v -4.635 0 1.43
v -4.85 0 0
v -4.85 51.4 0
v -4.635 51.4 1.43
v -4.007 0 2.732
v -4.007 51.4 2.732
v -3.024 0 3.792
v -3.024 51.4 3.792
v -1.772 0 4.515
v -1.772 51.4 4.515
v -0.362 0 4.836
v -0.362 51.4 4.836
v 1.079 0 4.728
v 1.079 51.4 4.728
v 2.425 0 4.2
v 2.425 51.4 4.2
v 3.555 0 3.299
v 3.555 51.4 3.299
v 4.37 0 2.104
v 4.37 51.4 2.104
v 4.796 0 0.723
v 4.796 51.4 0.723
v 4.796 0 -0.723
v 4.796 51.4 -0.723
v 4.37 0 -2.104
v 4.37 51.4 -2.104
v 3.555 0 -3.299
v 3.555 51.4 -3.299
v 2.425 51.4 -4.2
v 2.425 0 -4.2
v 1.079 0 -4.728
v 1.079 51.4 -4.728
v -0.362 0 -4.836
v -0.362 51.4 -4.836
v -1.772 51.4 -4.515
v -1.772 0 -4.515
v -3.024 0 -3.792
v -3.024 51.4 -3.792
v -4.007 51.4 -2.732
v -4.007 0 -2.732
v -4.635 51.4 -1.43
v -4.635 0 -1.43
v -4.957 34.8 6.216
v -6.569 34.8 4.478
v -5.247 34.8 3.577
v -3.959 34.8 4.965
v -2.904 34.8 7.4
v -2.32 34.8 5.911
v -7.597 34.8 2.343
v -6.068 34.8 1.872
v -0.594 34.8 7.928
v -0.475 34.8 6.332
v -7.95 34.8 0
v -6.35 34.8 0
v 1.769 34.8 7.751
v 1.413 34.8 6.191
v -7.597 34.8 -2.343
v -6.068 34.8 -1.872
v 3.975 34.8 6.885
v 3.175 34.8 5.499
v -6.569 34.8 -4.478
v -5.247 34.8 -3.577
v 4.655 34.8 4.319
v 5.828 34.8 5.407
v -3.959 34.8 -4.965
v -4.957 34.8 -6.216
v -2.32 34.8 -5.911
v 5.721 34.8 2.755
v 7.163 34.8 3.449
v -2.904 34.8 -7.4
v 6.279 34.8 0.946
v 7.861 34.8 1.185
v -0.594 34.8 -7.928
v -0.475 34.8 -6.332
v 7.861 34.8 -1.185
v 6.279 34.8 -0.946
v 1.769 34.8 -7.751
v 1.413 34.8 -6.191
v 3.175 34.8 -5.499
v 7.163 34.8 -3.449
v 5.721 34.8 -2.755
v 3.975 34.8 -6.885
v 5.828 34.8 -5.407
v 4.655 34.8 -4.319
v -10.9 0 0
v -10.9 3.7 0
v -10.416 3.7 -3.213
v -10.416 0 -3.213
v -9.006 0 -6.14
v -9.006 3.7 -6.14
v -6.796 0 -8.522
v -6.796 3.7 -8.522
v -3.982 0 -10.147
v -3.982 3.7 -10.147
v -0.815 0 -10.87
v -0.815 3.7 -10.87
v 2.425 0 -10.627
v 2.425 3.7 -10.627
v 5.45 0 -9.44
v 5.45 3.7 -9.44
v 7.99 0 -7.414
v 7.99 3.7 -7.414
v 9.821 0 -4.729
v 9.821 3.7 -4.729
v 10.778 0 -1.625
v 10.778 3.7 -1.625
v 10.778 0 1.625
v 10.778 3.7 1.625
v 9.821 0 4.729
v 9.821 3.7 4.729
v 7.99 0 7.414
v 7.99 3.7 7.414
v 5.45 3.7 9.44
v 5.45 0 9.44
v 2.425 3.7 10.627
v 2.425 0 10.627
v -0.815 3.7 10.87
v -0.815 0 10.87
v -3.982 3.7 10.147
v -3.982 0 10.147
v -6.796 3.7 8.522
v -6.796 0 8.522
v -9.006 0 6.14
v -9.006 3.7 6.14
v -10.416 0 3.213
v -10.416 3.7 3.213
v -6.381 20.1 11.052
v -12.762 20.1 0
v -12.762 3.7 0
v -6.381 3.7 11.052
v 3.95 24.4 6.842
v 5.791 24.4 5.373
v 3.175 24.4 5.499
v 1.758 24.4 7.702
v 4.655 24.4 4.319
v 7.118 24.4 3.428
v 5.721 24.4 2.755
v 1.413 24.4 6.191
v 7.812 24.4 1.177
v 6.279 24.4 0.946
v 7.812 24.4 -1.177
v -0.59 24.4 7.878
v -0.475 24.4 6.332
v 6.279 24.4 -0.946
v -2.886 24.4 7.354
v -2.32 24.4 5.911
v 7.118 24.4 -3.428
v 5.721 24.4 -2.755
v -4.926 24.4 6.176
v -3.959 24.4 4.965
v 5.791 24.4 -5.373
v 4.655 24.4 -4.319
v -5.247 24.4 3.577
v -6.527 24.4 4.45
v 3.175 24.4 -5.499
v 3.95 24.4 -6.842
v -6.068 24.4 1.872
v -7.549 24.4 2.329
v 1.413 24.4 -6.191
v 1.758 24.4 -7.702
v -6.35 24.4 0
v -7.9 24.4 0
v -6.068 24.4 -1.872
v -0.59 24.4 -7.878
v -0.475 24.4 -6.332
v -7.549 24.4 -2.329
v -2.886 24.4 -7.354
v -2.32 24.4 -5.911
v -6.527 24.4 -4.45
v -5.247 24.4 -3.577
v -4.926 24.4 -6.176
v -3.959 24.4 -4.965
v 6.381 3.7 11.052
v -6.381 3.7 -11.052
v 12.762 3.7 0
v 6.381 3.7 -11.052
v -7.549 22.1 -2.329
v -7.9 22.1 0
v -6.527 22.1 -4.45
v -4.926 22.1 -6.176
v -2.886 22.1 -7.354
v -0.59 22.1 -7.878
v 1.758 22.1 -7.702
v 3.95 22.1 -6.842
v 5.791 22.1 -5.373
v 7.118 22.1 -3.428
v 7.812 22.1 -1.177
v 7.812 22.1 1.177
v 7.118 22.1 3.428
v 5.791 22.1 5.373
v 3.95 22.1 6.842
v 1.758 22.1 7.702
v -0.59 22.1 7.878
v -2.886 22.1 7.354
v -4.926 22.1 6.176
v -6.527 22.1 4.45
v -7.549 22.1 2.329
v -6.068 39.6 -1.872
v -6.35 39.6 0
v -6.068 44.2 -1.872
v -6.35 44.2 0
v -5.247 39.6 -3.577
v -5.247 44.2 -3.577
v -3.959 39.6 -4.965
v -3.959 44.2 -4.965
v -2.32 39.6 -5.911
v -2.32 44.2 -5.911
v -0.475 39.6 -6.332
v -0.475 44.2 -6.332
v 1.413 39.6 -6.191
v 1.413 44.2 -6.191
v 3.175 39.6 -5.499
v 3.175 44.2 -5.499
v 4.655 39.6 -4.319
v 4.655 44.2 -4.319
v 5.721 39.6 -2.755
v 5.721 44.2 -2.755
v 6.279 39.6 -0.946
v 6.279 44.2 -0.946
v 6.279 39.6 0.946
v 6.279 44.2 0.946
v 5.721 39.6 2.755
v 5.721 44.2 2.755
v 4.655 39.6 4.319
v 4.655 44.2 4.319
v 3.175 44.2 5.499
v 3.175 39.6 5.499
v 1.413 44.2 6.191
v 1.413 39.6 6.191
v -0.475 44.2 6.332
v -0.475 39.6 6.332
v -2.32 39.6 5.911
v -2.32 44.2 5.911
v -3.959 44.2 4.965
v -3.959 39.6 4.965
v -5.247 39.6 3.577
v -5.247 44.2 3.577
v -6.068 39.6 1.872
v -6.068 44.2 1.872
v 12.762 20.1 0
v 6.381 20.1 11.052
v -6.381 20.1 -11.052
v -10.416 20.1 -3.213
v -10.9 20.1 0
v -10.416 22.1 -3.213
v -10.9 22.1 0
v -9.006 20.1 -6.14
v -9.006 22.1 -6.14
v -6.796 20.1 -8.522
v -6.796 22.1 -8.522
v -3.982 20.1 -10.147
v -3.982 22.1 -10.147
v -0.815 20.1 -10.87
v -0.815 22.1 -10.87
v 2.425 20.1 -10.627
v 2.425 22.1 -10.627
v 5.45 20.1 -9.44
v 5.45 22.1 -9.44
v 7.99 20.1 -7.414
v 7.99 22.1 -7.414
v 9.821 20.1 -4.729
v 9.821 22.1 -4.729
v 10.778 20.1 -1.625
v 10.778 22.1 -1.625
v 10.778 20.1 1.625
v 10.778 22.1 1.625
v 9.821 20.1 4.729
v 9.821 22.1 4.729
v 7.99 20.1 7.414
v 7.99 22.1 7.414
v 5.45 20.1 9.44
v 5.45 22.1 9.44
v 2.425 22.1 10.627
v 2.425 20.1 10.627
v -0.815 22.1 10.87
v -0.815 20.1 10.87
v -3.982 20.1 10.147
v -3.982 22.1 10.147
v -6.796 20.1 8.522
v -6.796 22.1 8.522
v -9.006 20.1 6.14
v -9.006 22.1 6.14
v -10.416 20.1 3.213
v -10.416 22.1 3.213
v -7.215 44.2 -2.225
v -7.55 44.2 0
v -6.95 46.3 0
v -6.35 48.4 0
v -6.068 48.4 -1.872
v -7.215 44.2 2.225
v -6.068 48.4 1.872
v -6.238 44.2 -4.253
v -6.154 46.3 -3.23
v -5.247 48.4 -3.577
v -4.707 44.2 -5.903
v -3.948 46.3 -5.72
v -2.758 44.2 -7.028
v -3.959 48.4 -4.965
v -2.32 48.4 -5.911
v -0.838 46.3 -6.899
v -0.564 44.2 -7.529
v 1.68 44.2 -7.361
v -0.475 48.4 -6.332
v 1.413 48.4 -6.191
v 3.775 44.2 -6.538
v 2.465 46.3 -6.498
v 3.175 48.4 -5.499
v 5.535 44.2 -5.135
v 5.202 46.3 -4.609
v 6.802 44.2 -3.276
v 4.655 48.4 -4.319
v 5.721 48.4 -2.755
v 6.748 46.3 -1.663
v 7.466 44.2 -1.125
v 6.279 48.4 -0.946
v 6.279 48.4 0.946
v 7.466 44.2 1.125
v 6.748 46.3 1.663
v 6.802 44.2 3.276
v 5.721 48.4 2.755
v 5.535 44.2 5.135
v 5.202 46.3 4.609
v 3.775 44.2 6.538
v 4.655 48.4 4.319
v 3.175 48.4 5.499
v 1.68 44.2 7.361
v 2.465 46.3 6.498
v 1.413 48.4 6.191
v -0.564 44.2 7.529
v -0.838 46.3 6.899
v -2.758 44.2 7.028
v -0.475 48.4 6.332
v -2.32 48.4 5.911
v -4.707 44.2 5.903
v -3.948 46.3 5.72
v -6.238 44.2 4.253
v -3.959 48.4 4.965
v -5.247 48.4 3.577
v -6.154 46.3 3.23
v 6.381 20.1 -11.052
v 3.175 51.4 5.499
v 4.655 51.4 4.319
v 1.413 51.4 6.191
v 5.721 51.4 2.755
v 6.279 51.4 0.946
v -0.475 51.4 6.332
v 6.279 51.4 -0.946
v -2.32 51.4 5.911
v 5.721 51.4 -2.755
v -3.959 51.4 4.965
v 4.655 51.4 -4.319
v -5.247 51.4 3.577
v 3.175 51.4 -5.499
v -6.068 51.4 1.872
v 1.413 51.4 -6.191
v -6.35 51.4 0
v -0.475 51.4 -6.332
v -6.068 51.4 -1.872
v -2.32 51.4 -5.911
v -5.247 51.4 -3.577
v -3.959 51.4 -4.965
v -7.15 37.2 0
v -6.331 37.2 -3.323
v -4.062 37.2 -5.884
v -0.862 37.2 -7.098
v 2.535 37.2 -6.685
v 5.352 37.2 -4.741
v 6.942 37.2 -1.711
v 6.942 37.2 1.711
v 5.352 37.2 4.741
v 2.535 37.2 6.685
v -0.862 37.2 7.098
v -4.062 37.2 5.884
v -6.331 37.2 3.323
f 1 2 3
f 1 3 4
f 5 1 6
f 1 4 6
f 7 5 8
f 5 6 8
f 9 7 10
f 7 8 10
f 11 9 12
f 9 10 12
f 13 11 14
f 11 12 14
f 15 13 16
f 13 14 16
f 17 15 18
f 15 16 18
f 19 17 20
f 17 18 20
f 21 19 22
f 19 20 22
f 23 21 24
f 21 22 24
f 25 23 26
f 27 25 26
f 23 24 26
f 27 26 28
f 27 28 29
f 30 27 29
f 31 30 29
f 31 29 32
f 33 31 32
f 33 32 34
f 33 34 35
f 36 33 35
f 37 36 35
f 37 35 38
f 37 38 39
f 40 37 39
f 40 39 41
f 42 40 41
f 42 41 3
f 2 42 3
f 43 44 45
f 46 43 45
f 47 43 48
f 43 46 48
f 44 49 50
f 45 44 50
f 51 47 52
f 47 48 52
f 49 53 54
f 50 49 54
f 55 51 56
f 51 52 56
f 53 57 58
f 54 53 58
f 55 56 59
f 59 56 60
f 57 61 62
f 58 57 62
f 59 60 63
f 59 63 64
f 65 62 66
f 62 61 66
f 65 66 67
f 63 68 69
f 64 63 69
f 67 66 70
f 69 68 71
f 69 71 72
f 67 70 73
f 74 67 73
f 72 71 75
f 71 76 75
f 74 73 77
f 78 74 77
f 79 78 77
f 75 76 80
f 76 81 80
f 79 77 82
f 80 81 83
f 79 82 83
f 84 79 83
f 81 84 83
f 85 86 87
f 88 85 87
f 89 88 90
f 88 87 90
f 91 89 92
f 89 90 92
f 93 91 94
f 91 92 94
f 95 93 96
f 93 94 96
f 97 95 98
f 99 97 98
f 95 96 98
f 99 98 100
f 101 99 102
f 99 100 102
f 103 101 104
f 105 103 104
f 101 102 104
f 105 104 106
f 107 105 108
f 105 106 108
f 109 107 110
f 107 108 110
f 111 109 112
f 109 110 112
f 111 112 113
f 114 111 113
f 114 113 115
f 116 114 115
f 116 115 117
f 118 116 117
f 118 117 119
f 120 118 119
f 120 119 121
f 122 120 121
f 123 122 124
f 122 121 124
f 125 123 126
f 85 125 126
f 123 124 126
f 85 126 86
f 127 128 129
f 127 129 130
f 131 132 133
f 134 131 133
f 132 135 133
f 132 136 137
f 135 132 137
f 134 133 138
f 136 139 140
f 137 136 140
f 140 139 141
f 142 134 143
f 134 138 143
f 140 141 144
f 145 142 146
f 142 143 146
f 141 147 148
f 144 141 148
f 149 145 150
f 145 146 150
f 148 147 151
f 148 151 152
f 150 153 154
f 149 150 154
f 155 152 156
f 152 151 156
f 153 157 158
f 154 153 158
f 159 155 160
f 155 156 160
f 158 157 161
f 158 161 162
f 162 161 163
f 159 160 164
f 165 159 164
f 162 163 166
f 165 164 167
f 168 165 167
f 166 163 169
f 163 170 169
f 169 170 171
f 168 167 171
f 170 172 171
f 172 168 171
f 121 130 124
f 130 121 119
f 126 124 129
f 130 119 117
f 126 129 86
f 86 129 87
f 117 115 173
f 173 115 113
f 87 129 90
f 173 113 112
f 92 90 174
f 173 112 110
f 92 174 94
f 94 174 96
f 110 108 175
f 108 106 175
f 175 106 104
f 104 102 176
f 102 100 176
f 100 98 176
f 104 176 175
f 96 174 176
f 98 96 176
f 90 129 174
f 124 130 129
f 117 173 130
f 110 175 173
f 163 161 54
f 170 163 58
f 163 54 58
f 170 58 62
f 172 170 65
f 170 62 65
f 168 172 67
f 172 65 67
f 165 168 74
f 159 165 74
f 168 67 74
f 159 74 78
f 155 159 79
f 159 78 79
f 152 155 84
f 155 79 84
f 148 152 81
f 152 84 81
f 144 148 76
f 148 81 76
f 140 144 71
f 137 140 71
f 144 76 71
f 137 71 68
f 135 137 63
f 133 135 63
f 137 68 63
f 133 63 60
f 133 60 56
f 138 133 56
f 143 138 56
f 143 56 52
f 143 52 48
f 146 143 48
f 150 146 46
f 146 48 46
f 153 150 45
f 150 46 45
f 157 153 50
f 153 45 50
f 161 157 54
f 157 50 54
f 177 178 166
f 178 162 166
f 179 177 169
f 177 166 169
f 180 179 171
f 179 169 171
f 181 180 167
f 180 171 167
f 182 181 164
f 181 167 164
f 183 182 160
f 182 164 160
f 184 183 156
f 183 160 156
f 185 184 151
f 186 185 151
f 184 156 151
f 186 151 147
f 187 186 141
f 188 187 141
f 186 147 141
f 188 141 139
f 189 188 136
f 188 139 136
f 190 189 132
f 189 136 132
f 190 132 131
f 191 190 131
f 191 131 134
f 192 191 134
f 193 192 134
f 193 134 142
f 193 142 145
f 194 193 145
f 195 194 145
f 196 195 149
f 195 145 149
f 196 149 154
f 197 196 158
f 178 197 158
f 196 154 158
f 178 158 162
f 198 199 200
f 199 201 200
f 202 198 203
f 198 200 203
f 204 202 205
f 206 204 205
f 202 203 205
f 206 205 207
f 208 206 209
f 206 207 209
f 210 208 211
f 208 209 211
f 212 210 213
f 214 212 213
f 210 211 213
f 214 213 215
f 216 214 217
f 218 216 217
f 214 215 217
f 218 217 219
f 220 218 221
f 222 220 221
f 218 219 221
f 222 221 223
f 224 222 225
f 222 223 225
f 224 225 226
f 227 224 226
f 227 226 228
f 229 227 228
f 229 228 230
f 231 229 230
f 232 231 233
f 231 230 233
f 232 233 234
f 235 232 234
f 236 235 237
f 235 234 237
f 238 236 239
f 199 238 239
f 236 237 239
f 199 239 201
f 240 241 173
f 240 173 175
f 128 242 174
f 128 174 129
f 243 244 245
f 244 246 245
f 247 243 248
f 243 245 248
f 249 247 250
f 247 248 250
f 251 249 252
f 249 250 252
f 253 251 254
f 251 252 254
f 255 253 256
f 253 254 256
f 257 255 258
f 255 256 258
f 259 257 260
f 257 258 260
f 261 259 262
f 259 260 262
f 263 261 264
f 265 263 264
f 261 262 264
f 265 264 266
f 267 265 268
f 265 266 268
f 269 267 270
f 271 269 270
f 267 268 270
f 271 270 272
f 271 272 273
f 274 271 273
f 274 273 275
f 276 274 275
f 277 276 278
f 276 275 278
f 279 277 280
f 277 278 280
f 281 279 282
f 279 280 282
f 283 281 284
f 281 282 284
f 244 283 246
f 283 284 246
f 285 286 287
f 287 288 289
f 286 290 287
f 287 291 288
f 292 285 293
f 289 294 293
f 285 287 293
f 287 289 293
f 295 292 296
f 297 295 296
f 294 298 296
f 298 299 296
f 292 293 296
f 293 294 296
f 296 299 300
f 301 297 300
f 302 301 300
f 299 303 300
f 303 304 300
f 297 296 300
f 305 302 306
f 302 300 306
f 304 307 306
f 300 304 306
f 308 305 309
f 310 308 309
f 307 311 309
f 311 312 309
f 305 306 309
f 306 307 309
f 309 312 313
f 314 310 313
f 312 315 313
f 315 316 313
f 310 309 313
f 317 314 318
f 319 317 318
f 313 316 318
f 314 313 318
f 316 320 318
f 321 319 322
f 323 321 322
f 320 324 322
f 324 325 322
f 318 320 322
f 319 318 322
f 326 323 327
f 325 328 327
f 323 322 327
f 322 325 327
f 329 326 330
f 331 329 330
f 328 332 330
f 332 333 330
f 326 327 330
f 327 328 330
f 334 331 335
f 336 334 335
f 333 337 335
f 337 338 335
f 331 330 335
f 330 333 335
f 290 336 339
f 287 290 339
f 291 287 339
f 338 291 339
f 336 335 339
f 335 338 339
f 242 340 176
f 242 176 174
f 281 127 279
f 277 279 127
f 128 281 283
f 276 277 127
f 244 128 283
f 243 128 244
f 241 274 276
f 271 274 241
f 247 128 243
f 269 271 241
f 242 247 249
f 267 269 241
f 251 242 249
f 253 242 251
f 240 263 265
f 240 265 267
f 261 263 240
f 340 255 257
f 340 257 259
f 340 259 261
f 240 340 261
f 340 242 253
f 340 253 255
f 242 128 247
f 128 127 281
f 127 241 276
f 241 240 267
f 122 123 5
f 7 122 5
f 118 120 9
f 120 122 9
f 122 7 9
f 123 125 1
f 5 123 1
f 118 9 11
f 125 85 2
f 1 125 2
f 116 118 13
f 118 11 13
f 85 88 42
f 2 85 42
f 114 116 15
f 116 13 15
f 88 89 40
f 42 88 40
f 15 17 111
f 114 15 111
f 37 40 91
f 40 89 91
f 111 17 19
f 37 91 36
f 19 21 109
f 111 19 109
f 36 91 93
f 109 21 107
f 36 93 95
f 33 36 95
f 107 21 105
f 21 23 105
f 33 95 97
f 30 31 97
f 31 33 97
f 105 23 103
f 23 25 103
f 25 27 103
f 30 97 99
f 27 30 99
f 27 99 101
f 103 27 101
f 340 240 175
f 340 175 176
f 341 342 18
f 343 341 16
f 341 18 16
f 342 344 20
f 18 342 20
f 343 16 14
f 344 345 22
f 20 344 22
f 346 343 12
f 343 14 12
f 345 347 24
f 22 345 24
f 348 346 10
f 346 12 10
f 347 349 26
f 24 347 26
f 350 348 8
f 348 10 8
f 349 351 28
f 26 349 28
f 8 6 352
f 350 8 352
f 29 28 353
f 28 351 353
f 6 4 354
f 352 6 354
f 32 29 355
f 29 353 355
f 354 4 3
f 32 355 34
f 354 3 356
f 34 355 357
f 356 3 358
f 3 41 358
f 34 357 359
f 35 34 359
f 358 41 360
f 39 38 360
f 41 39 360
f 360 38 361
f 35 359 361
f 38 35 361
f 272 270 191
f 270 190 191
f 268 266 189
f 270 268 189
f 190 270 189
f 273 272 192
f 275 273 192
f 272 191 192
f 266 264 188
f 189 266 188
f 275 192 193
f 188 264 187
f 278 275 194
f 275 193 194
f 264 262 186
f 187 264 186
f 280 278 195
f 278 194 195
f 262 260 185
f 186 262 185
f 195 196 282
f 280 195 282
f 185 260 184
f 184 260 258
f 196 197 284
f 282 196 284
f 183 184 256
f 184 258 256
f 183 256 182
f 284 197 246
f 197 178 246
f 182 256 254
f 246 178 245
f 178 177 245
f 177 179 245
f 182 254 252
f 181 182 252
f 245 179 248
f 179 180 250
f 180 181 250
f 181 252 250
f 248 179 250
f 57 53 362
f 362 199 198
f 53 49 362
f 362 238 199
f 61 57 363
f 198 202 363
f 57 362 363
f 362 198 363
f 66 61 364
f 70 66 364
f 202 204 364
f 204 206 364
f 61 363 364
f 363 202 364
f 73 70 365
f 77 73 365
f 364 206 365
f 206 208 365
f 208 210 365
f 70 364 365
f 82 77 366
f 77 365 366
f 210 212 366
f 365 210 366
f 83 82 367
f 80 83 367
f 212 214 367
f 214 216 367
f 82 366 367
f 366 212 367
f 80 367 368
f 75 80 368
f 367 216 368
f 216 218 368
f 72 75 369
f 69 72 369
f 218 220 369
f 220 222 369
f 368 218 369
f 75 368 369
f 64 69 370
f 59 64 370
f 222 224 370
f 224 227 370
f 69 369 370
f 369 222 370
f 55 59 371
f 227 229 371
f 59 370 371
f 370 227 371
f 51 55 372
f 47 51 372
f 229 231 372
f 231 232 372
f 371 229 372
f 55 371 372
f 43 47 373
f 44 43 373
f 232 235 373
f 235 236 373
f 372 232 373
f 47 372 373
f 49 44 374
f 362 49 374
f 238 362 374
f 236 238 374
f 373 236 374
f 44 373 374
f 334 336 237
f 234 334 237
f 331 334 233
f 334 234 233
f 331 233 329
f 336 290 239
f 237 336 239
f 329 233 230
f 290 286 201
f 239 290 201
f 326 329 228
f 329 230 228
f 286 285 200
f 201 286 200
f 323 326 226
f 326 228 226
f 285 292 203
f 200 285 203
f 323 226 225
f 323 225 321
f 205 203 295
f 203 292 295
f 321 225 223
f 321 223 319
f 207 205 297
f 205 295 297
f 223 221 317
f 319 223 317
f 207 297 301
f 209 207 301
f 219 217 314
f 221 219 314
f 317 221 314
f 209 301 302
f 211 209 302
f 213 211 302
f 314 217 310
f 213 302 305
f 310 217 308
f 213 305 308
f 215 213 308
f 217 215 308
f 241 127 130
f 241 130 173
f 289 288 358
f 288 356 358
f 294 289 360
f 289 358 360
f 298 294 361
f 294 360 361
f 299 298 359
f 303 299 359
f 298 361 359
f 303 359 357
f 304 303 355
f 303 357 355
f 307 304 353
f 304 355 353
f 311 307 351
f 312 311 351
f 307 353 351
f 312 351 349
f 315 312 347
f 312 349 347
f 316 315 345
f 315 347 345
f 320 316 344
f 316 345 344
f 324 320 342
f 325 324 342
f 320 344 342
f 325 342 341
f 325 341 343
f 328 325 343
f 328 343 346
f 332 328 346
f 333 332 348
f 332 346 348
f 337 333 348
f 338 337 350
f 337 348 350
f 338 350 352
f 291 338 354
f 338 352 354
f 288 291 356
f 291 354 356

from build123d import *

# Parameters (mm, degrees)
BOSS_EXTRUDE1_DEPTH = 16.4
SKETCH3_R           = 4.85
CUT_EXTRUDE1_DEPTH  = 55.101495482


with BuildPart() as part:
    # Sketch1 → Revolve1 (revolve)
    with BuildSketch(Plane.XY, mode=Mode.PRIVATE) as revolve1_sk:
        Polygon((0, 51.4), (0, 0), (10.9, 0), (10.9, 3.8), (11.05, 3.8), (11.05, 20.1), (10.9, 20.1), (10.9, 22.1), (7.9, 22.1), (7.9, 24.4), (6.35, 24.4), (6.35, 34.8), (7.95, 34.8), (6.35, 39.6), (6.35, 44.2), (7.55, 44.2), (6.35, 48.4), (6.35, 51.4), align=None)
    revolve(revolve1_sk.sketch.rotate(Axis((0, 51.4, 0), (0, -1, 0)), 180), axis=Axis((0, 51.4, 0), (0, -1, 0)))

    # Sketch2 → Boss-Extrude1 (add)
    with BuildSketch(Plane(origin=(0, 20.1, 0), x_dir=(1, 0, 0), z_dir=(0, 1, 0))):
        Polygon((12.761813873, 0), (6.380906937, 11.052055013), (-6.380906937, 11.052055013), (-12.761813873, 0), (-6.380906937, -11.052055013), (6.380906937, -11.052055013), align=None)
    extrude(amount=-BOSS_EXTRUDE1_DEPTH)

    # Sketch3 → Cut-Extrude1 (cut, through all)
    with BuildSketch(Plane(origin=(0, 51.4, 0), x_dir=(1, 0, 0), z_dir=(0, 1, 0))):
        with Locations(Location((0, 0, 0), (0, 0, 180))):
            Circle(SKETCH3_R)
    extrude(amount=-CUT_EXTRUDE1_DEPTH, mode=Mode.SUBTRACT)


solid = part.part
